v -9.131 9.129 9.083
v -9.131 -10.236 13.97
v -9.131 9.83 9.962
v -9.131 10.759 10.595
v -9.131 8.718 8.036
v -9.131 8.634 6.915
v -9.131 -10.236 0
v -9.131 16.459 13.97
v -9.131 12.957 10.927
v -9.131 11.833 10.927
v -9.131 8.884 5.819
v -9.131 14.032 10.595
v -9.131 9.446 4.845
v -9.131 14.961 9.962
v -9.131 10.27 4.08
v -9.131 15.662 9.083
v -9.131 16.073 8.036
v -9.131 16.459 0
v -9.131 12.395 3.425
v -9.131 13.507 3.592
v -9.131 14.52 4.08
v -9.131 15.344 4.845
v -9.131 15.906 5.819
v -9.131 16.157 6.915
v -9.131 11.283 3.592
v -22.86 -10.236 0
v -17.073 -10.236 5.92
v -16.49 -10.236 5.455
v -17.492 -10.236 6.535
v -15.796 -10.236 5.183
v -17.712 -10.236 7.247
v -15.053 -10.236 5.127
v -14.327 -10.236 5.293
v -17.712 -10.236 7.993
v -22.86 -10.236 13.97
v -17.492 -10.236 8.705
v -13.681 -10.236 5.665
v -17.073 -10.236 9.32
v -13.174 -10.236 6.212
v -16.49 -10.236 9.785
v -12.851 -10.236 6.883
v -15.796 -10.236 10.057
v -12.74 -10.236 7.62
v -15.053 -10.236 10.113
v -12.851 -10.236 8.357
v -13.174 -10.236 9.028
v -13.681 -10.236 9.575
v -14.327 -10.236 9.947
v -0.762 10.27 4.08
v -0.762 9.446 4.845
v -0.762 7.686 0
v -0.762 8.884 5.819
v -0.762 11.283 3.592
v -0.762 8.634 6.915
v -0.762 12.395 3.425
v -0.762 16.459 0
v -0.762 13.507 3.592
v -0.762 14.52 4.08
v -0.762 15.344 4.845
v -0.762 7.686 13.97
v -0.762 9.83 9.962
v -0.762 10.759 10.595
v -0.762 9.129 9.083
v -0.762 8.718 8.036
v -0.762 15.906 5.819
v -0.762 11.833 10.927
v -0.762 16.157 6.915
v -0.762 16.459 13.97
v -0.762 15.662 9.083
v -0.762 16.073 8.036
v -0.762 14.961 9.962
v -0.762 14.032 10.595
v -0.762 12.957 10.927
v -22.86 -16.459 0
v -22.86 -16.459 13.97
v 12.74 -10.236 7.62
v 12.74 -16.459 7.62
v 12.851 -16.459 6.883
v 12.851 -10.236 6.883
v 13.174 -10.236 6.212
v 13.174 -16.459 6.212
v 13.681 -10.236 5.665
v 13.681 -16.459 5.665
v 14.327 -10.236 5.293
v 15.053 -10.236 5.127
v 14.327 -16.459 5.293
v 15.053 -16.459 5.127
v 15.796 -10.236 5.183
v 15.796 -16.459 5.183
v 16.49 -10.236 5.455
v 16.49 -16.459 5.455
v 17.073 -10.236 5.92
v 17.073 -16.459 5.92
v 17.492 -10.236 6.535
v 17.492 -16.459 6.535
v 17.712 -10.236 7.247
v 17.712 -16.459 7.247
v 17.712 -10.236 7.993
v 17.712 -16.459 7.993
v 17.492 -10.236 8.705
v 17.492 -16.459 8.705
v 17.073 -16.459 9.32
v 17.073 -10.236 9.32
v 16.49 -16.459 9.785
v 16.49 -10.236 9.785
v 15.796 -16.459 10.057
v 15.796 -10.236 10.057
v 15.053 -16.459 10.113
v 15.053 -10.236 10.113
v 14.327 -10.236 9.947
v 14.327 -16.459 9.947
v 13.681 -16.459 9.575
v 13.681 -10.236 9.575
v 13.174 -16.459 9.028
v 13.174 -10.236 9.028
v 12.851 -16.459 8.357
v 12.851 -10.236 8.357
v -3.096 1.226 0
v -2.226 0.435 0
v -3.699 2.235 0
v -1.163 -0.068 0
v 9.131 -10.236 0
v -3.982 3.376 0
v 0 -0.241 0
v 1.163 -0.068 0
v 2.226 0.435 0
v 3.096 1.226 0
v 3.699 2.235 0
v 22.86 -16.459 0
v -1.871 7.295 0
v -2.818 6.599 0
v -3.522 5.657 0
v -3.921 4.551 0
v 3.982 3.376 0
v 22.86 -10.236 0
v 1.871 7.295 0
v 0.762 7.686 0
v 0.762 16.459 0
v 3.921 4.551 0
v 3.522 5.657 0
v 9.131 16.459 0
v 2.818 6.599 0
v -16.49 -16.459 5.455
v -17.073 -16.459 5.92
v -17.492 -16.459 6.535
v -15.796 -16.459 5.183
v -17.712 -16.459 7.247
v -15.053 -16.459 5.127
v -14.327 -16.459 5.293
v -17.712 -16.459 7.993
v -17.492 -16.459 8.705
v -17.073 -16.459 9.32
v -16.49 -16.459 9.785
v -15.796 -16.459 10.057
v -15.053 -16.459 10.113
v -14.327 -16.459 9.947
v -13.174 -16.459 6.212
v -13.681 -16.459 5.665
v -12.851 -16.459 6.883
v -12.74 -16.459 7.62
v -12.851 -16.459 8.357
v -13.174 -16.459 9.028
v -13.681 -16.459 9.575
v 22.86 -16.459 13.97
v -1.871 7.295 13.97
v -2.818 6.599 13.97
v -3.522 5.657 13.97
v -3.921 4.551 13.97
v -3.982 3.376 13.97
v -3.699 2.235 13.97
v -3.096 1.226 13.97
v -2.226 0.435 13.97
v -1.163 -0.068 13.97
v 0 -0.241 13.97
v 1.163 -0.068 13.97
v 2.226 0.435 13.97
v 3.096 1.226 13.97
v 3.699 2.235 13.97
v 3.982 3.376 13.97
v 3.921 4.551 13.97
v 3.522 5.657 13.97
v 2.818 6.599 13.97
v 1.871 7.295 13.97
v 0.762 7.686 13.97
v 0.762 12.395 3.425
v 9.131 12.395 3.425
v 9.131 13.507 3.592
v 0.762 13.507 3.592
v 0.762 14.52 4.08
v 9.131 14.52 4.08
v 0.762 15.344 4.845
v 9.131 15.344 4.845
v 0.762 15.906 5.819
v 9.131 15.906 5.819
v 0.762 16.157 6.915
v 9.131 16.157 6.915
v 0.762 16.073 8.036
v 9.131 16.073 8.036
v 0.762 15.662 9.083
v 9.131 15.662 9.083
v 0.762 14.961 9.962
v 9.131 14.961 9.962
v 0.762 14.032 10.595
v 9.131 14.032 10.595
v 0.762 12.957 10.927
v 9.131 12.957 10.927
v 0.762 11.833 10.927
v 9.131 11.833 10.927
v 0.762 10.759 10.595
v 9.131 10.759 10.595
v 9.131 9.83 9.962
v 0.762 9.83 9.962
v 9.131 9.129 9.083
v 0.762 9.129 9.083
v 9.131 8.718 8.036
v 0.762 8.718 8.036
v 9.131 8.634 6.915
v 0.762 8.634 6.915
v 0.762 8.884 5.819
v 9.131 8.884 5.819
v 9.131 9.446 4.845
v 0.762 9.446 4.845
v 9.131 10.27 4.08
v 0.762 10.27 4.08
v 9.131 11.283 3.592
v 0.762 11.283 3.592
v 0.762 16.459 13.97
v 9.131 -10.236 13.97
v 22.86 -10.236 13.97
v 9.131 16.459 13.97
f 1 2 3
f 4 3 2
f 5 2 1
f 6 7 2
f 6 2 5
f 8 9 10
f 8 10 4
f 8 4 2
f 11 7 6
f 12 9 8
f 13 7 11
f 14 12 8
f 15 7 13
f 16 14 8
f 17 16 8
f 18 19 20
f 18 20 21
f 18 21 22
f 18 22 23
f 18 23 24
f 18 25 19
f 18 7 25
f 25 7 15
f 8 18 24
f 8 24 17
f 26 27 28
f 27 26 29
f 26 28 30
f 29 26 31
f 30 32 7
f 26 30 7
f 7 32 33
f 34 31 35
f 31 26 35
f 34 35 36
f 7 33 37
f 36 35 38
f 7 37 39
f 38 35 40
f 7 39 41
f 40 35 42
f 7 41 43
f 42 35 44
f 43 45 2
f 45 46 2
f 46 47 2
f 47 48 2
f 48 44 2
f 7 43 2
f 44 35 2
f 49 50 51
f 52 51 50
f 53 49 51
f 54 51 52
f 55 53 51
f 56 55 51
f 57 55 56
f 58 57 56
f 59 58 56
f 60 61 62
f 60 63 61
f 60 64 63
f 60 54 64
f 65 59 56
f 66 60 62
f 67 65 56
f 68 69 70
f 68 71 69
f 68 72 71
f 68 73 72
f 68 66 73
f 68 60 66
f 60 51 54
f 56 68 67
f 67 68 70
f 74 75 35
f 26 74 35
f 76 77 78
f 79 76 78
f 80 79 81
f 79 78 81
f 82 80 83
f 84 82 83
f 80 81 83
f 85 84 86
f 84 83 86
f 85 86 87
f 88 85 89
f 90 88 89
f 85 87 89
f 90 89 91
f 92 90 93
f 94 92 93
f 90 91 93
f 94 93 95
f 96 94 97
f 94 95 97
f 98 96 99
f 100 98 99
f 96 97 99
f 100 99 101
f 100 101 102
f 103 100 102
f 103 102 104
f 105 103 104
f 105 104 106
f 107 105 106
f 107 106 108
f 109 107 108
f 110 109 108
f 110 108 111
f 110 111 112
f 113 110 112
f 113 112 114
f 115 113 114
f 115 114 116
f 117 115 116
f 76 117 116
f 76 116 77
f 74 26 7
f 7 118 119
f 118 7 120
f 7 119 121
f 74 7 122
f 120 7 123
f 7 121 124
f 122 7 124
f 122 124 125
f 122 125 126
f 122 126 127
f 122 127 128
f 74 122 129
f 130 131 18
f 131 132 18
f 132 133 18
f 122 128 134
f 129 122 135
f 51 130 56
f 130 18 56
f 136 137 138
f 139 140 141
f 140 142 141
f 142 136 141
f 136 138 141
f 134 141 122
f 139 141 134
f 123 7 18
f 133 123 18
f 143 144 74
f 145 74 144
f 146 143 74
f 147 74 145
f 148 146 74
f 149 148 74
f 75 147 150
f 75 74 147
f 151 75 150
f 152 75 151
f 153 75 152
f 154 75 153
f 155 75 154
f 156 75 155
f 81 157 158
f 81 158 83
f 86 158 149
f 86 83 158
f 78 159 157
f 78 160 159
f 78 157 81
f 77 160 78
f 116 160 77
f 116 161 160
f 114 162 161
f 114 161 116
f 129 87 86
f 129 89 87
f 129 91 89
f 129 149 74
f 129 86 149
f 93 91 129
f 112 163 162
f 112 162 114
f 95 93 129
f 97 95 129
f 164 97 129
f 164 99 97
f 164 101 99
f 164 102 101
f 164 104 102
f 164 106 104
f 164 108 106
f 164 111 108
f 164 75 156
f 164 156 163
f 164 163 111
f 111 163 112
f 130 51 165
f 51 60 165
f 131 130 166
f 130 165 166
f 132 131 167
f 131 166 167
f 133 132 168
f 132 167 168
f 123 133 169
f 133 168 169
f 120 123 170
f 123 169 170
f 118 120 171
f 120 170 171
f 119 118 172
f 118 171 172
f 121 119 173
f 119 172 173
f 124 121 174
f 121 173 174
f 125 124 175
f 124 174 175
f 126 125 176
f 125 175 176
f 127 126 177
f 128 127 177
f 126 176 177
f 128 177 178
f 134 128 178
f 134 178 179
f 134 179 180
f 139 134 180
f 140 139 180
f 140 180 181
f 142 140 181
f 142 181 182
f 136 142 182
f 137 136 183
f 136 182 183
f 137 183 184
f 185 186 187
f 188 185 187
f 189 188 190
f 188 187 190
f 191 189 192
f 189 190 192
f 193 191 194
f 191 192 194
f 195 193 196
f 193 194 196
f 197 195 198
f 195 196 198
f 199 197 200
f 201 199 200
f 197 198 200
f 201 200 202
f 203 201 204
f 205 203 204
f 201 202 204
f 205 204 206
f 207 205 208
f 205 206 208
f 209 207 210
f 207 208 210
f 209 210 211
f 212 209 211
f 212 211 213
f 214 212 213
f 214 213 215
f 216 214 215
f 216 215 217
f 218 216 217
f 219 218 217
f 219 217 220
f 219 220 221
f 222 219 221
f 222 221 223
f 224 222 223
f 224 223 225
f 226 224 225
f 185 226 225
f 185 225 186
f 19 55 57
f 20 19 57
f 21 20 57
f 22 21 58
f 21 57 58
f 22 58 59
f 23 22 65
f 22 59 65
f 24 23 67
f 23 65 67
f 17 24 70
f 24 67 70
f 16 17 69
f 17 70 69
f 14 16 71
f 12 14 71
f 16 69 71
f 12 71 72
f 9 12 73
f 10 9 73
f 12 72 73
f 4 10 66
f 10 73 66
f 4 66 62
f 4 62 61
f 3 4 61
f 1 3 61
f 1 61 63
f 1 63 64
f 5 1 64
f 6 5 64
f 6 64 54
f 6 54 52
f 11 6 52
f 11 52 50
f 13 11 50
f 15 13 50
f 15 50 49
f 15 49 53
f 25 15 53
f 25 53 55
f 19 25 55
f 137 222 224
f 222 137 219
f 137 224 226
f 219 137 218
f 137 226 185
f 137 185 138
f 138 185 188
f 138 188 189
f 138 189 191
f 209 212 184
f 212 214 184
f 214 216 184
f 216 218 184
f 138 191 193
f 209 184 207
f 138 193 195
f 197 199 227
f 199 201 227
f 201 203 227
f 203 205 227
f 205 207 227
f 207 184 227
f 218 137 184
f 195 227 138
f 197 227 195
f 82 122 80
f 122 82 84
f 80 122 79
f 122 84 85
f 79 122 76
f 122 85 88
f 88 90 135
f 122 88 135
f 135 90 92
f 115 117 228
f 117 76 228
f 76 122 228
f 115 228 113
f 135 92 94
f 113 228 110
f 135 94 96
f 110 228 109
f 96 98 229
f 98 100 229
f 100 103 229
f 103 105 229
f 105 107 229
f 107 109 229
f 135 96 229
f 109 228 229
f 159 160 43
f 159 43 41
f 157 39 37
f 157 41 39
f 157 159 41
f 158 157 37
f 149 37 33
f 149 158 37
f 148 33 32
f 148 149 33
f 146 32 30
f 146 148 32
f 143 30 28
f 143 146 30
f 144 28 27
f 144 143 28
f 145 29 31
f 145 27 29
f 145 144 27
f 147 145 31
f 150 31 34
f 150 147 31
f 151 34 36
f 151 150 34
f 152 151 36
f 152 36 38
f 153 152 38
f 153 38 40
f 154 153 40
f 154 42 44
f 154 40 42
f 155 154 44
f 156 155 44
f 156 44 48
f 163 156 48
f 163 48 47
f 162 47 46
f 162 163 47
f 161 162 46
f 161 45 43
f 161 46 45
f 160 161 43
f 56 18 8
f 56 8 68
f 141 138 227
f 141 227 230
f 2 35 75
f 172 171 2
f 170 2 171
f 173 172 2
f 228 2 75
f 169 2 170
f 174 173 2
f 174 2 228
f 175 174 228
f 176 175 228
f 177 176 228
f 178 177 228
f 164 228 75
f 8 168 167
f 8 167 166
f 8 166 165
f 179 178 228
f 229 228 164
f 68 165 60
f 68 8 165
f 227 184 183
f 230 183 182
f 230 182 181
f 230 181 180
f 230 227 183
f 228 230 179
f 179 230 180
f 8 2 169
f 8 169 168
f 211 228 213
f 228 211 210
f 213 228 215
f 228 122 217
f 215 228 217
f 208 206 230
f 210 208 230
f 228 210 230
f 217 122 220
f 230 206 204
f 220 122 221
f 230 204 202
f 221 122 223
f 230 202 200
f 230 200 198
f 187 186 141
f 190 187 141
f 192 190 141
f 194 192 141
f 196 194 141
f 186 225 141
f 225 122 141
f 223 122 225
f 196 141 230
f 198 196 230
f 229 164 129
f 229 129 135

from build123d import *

# Parameters (mm, degrees)
SKETCH1_W              = 18.2626
SKETCH1_H              = 32.9184
MAIN_BODY_DEPTH        = 13.97
SKETCH2_W              = 45.72
SKETCH2_H              = 6.223
BOTTOM_BODY_DEPTH      = 13.97
SKETCH3_R              = 4.0005
CENTER_HOLE_DEPTH      = 1
CENTER_HOLE_DEPTH_BACK = 14.97
SKETCH4_W              = 1.524
SKETCH4_H              = 24.062462206
CENTER_CUT_DEPTH       = 14.97
SKETCH5_R              = 3.7719
SIDE_HOLE_DEPTH        = 32.9913
F_5_0MM_DOWEL_HOLE1_D  = 5


with BuildPart() as part:
    # Sketch1 → Main Body] (new body)
    with BuildSketch(Plane.XY):
        Rectangle(SKETCH1_W, SKETCH1_H)
    extrude(amount=MAIN_BODY_DEPTH)

    # Sketch2 → Bottom Body (add)
    with BuildSketch(Plane.XY.offset(13.97)):
        with Locations((0, -13.3477)):
            Rectangle(SKETCH2_W, SKETCH2_H)
    extrude(amount=-BOTTOM_BODY_DEPTH)

    # Sketch3 → Center Hole (cut, two sides)
    with BuildSketch(Plane.XY.offset(13.97)) as center_hole_sk:
        with Locations((0, 3.7592)):
            Circle(SKETCH3_R)
    extrude(amount=CENTER_HOLE_DEPTH, mode=Mode.SUBTRACT)
    extrude(center_hole_sk.sketch, amount=-CENTER_HOLE_DEPTH_BACK, mode=Mode.SUBTRACT)

    # Sketch4 → Center Cut (cut, through all)
    with BuildSketch(Plane.XY.offset(13.97)):
        with Locations((0, 16.4592)):
            Rectangle(SKETCH4_W, SKETCH4_H)
    extrude(amount=-CENTER_CUT_DEPTH, mode=Mode.SUBTRACT)

    # Sketch5 → Side Hole (cut, through all)
    with BuildSketch(Plane(origin=(9.1313, 0, 0), x_dir=(0, 0, -1), z_dir=(1, 0, 0))):
        with Locations((-7.196820587, 12.3952)):
            Circle(SKETCH5_R)
    extrude(amount=-SIDE_HOLE_DEPTH, mode=Mode.SUBTRACT)

    # Ø5.0mm Dowel Hole1 (through all)
    with Locations(Plane(origin=(0, -10.2362, 0), x_dir=(1, 0, 0), z_dir=(0, 1, 0))):
        with Locations((15.24, -7.62)):
            f_5_0mm_dowel_hole1 = Hole(F_5_0MM_DOWEL_HOLE1_D / 2)

    # Mirror1: Ø5.0mm Dowel Hole1 across plane
    add(f_5_0mm_dowel_hole1.mirror(Plane(origin=(0, 0, 0), x_dir=(0, 0, 1), z_dir=(1, 0, 0))), mode=Mode.SUBTRACT)


solid = part.part
